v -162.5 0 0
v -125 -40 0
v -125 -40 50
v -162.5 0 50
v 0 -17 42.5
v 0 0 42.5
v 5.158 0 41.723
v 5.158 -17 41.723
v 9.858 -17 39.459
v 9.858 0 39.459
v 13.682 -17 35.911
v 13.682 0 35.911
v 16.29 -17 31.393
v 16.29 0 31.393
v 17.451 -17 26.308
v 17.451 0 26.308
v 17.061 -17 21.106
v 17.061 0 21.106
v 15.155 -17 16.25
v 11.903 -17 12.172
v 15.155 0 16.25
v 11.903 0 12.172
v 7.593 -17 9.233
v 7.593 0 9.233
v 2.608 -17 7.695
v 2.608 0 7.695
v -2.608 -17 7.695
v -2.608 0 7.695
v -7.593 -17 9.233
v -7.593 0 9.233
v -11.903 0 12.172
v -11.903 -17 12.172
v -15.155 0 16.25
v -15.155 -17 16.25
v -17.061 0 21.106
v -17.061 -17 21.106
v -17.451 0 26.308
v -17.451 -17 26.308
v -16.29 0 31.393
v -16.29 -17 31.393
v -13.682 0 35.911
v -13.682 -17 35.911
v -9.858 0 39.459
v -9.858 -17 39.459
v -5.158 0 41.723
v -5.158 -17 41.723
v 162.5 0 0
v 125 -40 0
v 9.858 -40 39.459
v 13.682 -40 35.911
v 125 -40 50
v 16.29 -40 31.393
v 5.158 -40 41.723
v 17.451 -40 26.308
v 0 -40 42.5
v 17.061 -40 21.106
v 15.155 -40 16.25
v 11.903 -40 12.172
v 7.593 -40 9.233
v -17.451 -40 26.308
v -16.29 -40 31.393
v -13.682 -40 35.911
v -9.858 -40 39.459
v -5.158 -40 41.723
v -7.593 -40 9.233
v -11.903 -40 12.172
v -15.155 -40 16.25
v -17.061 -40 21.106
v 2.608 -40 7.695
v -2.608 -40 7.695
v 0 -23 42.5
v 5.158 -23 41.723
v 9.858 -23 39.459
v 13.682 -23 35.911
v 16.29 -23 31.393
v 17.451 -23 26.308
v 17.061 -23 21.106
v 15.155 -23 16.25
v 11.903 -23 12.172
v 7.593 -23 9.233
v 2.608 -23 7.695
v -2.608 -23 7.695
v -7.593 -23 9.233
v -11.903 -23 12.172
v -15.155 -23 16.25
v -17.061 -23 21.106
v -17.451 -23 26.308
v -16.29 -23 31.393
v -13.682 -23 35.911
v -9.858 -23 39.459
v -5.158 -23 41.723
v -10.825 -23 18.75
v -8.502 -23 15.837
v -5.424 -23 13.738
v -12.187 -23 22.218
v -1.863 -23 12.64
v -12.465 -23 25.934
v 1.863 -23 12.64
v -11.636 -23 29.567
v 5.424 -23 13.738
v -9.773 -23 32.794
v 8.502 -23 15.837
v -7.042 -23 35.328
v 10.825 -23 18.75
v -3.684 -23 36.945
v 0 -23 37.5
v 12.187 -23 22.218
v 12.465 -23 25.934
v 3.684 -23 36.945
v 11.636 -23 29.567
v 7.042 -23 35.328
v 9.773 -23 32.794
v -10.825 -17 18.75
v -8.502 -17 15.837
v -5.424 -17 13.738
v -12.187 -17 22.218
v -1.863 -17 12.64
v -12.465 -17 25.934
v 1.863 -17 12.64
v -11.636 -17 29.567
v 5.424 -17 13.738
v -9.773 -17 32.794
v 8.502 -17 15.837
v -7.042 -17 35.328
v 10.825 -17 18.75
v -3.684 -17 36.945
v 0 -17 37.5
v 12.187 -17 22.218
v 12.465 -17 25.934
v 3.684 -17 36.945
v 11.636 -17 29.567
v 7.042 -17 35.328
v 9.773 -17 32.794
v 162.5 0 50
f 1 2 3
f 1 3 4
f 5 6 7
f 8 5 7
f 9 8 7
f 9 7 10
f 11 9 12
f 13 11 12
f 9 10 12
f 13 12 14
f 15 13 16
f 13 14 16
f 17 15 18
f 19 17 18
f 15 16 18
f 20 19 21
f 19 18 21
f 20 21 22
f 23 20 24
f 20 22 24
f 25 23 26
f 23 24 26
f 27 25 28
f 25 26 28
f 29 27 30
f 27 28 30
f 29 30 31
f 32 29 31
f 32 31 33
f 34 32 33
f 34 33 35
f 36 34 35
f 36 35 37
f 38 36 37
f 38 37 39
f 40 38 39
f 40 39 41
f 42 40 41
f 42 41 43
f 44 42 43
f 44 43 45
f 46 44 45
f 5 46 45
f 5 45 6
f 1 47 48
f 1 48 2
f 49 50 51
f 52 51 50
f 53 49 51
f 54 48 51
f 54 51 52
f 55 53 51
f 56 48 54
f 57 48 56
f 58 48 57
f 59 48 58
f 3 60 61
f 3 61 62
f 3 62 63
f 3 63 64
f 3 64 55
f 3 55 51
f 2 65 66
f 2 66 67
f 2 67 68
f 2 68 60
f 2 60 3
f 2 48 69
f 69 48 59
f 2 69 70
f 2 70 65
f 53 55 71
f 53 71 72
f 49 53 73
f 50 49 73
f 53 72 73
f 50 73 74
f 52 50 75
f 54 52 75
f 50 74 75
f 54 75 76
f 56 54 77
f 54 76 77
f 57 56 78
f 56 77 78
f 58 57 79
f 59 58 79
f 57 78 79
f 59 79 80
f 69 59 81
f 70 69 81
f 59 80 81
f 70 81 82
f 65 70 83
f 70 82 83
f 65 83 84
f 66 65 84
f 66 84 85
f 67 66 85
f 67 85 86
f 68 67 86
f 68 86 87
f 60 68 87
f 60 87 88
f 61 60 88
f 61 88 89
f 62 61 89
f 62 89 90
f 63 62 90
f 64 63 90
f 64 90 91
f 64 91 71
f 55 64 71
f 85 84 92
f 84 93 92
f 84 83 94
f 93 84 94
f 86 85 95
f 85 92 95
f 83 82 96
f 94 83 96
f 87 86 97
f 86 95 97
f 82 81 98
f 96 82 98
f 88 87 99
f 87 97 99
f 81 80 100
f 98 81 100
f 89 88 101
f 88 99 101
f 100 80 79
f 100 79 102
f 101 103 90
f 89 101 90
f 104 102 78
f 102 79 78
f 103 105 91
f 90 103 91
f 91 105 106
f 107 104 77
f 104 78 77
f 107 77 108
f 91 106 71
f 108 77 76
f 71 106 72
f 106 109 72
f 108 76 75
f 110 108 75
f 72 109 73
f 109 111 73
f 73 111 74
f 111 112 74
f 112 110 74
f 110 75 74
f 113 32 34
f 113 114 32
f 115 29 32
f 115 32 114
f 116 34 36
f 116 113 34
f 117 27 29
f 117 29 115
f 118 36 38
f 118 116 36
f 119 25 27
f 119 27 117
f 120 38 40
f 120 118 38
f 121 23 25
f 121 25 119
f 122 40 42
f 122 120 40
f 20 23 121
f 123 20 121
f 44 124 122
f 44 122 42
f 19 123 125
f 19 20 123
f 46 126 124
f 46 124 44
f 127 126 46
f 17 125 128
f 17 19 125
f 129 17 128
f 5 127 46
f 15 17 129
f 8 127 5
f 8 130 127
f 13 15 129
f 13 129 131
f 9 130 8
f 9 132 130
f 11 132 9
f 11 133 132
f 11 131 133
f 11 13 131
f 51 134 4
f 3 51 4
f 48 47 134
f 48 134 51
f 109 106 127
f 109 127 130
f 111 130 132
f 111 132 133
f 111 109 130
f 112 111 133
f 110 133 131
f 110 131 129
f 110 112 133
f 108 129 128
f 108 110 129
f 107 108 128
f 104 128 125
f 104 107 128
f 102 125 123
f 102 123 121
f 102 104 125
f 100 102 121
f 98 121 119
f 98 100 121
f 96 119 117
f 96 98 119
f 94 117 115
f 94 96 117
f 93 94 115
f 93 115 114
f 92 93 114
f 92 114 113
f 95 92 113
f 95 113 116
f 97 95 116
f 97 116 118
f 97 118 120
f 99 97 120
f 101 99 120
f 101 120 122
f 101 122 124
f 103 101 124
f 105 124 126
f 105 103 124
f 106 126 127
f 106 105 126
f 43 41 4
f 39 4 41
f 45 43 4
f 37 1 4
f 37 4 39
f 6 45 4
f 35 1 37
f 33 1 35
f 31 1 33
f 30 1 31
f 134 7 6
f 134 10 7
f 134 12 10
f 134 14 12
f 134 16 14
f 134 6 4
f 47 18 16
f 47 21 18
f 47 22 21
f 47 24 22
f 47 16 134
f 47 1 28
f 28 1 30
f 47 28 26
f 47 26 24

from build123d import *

# Parameters (mm, degrees)
BOSS_EXTRUDE1_DEPTH      = 50
CUT_EXTRUDE1_REACH       = 176.66
SKETCH2_R                = 17.5
BOSS_EXTRUDE2_DEPTH      = 3
BOSS_EXTRUDE2_DEPTH_BACK = 3
SKETCH3_R                = 17.5
SKETCH3_R_2              = 12.5


with BuildPart() as part:
    # Sketch1 → Boss-Extrude1 (new body)
    with BuildSketch(Plane.XY):
        Polygon((-162.5, 0), (162.5, 0), (125, -40), (-125, -40), align=None)
    extrude(amount=BOSS_EXTRUDE1_DEPTH)

    # Sketch2 → Cut-Extrude1 (cut, up to next)
    with BuildSketch(Plane(origin=(0, 0, 0), x_dir=(1, 0, 0), z_dir=(0, 1, 0)), mode=Mode.PRIVATE) as cut_extrude1_sk1:
        with Locations(Location((0, -25, 0), (0, 0, 270))):
            Circle(SKETCH2_R)
    cut_extrude1_tool1 = extrude(cut_extrude1_sk1.sketch, amount=-CUT_EXTRUDE1_REACH, mode=Mode.PRIVATE) & part.part
    add(cut_extrude1_tool1.solids().sort_by_distance((0, 0, 25))[0], mode=Mode.SUBTRACT)

    # Sketch3 → Boss-Extrude2 (add, two sides: drawn at the far end of the back side and taken through both)
    with BuildSketch(Plane(origin=(0, -20, 0), x_dir=(1, 0, 0), z_dir=(0, 1, 0)).offset(-BOSS_EXTRUDE2_DEPTH_BACK)):
        with Locations(Location((0, -25, 0), (0, 0, 270))):
            Circle(SKETCH3_R)
        with Locations(Location((0, -25, 0), (0, 0, 270))):
            Circle(SKETCH3_R_2, mode=Mode.SUBTRACT)
    extrude(amount=BOSS_EXTRUDE2_DEPTH + BOSS_EXTRUDE2_DEPTH_BACK)


solid = part.part
